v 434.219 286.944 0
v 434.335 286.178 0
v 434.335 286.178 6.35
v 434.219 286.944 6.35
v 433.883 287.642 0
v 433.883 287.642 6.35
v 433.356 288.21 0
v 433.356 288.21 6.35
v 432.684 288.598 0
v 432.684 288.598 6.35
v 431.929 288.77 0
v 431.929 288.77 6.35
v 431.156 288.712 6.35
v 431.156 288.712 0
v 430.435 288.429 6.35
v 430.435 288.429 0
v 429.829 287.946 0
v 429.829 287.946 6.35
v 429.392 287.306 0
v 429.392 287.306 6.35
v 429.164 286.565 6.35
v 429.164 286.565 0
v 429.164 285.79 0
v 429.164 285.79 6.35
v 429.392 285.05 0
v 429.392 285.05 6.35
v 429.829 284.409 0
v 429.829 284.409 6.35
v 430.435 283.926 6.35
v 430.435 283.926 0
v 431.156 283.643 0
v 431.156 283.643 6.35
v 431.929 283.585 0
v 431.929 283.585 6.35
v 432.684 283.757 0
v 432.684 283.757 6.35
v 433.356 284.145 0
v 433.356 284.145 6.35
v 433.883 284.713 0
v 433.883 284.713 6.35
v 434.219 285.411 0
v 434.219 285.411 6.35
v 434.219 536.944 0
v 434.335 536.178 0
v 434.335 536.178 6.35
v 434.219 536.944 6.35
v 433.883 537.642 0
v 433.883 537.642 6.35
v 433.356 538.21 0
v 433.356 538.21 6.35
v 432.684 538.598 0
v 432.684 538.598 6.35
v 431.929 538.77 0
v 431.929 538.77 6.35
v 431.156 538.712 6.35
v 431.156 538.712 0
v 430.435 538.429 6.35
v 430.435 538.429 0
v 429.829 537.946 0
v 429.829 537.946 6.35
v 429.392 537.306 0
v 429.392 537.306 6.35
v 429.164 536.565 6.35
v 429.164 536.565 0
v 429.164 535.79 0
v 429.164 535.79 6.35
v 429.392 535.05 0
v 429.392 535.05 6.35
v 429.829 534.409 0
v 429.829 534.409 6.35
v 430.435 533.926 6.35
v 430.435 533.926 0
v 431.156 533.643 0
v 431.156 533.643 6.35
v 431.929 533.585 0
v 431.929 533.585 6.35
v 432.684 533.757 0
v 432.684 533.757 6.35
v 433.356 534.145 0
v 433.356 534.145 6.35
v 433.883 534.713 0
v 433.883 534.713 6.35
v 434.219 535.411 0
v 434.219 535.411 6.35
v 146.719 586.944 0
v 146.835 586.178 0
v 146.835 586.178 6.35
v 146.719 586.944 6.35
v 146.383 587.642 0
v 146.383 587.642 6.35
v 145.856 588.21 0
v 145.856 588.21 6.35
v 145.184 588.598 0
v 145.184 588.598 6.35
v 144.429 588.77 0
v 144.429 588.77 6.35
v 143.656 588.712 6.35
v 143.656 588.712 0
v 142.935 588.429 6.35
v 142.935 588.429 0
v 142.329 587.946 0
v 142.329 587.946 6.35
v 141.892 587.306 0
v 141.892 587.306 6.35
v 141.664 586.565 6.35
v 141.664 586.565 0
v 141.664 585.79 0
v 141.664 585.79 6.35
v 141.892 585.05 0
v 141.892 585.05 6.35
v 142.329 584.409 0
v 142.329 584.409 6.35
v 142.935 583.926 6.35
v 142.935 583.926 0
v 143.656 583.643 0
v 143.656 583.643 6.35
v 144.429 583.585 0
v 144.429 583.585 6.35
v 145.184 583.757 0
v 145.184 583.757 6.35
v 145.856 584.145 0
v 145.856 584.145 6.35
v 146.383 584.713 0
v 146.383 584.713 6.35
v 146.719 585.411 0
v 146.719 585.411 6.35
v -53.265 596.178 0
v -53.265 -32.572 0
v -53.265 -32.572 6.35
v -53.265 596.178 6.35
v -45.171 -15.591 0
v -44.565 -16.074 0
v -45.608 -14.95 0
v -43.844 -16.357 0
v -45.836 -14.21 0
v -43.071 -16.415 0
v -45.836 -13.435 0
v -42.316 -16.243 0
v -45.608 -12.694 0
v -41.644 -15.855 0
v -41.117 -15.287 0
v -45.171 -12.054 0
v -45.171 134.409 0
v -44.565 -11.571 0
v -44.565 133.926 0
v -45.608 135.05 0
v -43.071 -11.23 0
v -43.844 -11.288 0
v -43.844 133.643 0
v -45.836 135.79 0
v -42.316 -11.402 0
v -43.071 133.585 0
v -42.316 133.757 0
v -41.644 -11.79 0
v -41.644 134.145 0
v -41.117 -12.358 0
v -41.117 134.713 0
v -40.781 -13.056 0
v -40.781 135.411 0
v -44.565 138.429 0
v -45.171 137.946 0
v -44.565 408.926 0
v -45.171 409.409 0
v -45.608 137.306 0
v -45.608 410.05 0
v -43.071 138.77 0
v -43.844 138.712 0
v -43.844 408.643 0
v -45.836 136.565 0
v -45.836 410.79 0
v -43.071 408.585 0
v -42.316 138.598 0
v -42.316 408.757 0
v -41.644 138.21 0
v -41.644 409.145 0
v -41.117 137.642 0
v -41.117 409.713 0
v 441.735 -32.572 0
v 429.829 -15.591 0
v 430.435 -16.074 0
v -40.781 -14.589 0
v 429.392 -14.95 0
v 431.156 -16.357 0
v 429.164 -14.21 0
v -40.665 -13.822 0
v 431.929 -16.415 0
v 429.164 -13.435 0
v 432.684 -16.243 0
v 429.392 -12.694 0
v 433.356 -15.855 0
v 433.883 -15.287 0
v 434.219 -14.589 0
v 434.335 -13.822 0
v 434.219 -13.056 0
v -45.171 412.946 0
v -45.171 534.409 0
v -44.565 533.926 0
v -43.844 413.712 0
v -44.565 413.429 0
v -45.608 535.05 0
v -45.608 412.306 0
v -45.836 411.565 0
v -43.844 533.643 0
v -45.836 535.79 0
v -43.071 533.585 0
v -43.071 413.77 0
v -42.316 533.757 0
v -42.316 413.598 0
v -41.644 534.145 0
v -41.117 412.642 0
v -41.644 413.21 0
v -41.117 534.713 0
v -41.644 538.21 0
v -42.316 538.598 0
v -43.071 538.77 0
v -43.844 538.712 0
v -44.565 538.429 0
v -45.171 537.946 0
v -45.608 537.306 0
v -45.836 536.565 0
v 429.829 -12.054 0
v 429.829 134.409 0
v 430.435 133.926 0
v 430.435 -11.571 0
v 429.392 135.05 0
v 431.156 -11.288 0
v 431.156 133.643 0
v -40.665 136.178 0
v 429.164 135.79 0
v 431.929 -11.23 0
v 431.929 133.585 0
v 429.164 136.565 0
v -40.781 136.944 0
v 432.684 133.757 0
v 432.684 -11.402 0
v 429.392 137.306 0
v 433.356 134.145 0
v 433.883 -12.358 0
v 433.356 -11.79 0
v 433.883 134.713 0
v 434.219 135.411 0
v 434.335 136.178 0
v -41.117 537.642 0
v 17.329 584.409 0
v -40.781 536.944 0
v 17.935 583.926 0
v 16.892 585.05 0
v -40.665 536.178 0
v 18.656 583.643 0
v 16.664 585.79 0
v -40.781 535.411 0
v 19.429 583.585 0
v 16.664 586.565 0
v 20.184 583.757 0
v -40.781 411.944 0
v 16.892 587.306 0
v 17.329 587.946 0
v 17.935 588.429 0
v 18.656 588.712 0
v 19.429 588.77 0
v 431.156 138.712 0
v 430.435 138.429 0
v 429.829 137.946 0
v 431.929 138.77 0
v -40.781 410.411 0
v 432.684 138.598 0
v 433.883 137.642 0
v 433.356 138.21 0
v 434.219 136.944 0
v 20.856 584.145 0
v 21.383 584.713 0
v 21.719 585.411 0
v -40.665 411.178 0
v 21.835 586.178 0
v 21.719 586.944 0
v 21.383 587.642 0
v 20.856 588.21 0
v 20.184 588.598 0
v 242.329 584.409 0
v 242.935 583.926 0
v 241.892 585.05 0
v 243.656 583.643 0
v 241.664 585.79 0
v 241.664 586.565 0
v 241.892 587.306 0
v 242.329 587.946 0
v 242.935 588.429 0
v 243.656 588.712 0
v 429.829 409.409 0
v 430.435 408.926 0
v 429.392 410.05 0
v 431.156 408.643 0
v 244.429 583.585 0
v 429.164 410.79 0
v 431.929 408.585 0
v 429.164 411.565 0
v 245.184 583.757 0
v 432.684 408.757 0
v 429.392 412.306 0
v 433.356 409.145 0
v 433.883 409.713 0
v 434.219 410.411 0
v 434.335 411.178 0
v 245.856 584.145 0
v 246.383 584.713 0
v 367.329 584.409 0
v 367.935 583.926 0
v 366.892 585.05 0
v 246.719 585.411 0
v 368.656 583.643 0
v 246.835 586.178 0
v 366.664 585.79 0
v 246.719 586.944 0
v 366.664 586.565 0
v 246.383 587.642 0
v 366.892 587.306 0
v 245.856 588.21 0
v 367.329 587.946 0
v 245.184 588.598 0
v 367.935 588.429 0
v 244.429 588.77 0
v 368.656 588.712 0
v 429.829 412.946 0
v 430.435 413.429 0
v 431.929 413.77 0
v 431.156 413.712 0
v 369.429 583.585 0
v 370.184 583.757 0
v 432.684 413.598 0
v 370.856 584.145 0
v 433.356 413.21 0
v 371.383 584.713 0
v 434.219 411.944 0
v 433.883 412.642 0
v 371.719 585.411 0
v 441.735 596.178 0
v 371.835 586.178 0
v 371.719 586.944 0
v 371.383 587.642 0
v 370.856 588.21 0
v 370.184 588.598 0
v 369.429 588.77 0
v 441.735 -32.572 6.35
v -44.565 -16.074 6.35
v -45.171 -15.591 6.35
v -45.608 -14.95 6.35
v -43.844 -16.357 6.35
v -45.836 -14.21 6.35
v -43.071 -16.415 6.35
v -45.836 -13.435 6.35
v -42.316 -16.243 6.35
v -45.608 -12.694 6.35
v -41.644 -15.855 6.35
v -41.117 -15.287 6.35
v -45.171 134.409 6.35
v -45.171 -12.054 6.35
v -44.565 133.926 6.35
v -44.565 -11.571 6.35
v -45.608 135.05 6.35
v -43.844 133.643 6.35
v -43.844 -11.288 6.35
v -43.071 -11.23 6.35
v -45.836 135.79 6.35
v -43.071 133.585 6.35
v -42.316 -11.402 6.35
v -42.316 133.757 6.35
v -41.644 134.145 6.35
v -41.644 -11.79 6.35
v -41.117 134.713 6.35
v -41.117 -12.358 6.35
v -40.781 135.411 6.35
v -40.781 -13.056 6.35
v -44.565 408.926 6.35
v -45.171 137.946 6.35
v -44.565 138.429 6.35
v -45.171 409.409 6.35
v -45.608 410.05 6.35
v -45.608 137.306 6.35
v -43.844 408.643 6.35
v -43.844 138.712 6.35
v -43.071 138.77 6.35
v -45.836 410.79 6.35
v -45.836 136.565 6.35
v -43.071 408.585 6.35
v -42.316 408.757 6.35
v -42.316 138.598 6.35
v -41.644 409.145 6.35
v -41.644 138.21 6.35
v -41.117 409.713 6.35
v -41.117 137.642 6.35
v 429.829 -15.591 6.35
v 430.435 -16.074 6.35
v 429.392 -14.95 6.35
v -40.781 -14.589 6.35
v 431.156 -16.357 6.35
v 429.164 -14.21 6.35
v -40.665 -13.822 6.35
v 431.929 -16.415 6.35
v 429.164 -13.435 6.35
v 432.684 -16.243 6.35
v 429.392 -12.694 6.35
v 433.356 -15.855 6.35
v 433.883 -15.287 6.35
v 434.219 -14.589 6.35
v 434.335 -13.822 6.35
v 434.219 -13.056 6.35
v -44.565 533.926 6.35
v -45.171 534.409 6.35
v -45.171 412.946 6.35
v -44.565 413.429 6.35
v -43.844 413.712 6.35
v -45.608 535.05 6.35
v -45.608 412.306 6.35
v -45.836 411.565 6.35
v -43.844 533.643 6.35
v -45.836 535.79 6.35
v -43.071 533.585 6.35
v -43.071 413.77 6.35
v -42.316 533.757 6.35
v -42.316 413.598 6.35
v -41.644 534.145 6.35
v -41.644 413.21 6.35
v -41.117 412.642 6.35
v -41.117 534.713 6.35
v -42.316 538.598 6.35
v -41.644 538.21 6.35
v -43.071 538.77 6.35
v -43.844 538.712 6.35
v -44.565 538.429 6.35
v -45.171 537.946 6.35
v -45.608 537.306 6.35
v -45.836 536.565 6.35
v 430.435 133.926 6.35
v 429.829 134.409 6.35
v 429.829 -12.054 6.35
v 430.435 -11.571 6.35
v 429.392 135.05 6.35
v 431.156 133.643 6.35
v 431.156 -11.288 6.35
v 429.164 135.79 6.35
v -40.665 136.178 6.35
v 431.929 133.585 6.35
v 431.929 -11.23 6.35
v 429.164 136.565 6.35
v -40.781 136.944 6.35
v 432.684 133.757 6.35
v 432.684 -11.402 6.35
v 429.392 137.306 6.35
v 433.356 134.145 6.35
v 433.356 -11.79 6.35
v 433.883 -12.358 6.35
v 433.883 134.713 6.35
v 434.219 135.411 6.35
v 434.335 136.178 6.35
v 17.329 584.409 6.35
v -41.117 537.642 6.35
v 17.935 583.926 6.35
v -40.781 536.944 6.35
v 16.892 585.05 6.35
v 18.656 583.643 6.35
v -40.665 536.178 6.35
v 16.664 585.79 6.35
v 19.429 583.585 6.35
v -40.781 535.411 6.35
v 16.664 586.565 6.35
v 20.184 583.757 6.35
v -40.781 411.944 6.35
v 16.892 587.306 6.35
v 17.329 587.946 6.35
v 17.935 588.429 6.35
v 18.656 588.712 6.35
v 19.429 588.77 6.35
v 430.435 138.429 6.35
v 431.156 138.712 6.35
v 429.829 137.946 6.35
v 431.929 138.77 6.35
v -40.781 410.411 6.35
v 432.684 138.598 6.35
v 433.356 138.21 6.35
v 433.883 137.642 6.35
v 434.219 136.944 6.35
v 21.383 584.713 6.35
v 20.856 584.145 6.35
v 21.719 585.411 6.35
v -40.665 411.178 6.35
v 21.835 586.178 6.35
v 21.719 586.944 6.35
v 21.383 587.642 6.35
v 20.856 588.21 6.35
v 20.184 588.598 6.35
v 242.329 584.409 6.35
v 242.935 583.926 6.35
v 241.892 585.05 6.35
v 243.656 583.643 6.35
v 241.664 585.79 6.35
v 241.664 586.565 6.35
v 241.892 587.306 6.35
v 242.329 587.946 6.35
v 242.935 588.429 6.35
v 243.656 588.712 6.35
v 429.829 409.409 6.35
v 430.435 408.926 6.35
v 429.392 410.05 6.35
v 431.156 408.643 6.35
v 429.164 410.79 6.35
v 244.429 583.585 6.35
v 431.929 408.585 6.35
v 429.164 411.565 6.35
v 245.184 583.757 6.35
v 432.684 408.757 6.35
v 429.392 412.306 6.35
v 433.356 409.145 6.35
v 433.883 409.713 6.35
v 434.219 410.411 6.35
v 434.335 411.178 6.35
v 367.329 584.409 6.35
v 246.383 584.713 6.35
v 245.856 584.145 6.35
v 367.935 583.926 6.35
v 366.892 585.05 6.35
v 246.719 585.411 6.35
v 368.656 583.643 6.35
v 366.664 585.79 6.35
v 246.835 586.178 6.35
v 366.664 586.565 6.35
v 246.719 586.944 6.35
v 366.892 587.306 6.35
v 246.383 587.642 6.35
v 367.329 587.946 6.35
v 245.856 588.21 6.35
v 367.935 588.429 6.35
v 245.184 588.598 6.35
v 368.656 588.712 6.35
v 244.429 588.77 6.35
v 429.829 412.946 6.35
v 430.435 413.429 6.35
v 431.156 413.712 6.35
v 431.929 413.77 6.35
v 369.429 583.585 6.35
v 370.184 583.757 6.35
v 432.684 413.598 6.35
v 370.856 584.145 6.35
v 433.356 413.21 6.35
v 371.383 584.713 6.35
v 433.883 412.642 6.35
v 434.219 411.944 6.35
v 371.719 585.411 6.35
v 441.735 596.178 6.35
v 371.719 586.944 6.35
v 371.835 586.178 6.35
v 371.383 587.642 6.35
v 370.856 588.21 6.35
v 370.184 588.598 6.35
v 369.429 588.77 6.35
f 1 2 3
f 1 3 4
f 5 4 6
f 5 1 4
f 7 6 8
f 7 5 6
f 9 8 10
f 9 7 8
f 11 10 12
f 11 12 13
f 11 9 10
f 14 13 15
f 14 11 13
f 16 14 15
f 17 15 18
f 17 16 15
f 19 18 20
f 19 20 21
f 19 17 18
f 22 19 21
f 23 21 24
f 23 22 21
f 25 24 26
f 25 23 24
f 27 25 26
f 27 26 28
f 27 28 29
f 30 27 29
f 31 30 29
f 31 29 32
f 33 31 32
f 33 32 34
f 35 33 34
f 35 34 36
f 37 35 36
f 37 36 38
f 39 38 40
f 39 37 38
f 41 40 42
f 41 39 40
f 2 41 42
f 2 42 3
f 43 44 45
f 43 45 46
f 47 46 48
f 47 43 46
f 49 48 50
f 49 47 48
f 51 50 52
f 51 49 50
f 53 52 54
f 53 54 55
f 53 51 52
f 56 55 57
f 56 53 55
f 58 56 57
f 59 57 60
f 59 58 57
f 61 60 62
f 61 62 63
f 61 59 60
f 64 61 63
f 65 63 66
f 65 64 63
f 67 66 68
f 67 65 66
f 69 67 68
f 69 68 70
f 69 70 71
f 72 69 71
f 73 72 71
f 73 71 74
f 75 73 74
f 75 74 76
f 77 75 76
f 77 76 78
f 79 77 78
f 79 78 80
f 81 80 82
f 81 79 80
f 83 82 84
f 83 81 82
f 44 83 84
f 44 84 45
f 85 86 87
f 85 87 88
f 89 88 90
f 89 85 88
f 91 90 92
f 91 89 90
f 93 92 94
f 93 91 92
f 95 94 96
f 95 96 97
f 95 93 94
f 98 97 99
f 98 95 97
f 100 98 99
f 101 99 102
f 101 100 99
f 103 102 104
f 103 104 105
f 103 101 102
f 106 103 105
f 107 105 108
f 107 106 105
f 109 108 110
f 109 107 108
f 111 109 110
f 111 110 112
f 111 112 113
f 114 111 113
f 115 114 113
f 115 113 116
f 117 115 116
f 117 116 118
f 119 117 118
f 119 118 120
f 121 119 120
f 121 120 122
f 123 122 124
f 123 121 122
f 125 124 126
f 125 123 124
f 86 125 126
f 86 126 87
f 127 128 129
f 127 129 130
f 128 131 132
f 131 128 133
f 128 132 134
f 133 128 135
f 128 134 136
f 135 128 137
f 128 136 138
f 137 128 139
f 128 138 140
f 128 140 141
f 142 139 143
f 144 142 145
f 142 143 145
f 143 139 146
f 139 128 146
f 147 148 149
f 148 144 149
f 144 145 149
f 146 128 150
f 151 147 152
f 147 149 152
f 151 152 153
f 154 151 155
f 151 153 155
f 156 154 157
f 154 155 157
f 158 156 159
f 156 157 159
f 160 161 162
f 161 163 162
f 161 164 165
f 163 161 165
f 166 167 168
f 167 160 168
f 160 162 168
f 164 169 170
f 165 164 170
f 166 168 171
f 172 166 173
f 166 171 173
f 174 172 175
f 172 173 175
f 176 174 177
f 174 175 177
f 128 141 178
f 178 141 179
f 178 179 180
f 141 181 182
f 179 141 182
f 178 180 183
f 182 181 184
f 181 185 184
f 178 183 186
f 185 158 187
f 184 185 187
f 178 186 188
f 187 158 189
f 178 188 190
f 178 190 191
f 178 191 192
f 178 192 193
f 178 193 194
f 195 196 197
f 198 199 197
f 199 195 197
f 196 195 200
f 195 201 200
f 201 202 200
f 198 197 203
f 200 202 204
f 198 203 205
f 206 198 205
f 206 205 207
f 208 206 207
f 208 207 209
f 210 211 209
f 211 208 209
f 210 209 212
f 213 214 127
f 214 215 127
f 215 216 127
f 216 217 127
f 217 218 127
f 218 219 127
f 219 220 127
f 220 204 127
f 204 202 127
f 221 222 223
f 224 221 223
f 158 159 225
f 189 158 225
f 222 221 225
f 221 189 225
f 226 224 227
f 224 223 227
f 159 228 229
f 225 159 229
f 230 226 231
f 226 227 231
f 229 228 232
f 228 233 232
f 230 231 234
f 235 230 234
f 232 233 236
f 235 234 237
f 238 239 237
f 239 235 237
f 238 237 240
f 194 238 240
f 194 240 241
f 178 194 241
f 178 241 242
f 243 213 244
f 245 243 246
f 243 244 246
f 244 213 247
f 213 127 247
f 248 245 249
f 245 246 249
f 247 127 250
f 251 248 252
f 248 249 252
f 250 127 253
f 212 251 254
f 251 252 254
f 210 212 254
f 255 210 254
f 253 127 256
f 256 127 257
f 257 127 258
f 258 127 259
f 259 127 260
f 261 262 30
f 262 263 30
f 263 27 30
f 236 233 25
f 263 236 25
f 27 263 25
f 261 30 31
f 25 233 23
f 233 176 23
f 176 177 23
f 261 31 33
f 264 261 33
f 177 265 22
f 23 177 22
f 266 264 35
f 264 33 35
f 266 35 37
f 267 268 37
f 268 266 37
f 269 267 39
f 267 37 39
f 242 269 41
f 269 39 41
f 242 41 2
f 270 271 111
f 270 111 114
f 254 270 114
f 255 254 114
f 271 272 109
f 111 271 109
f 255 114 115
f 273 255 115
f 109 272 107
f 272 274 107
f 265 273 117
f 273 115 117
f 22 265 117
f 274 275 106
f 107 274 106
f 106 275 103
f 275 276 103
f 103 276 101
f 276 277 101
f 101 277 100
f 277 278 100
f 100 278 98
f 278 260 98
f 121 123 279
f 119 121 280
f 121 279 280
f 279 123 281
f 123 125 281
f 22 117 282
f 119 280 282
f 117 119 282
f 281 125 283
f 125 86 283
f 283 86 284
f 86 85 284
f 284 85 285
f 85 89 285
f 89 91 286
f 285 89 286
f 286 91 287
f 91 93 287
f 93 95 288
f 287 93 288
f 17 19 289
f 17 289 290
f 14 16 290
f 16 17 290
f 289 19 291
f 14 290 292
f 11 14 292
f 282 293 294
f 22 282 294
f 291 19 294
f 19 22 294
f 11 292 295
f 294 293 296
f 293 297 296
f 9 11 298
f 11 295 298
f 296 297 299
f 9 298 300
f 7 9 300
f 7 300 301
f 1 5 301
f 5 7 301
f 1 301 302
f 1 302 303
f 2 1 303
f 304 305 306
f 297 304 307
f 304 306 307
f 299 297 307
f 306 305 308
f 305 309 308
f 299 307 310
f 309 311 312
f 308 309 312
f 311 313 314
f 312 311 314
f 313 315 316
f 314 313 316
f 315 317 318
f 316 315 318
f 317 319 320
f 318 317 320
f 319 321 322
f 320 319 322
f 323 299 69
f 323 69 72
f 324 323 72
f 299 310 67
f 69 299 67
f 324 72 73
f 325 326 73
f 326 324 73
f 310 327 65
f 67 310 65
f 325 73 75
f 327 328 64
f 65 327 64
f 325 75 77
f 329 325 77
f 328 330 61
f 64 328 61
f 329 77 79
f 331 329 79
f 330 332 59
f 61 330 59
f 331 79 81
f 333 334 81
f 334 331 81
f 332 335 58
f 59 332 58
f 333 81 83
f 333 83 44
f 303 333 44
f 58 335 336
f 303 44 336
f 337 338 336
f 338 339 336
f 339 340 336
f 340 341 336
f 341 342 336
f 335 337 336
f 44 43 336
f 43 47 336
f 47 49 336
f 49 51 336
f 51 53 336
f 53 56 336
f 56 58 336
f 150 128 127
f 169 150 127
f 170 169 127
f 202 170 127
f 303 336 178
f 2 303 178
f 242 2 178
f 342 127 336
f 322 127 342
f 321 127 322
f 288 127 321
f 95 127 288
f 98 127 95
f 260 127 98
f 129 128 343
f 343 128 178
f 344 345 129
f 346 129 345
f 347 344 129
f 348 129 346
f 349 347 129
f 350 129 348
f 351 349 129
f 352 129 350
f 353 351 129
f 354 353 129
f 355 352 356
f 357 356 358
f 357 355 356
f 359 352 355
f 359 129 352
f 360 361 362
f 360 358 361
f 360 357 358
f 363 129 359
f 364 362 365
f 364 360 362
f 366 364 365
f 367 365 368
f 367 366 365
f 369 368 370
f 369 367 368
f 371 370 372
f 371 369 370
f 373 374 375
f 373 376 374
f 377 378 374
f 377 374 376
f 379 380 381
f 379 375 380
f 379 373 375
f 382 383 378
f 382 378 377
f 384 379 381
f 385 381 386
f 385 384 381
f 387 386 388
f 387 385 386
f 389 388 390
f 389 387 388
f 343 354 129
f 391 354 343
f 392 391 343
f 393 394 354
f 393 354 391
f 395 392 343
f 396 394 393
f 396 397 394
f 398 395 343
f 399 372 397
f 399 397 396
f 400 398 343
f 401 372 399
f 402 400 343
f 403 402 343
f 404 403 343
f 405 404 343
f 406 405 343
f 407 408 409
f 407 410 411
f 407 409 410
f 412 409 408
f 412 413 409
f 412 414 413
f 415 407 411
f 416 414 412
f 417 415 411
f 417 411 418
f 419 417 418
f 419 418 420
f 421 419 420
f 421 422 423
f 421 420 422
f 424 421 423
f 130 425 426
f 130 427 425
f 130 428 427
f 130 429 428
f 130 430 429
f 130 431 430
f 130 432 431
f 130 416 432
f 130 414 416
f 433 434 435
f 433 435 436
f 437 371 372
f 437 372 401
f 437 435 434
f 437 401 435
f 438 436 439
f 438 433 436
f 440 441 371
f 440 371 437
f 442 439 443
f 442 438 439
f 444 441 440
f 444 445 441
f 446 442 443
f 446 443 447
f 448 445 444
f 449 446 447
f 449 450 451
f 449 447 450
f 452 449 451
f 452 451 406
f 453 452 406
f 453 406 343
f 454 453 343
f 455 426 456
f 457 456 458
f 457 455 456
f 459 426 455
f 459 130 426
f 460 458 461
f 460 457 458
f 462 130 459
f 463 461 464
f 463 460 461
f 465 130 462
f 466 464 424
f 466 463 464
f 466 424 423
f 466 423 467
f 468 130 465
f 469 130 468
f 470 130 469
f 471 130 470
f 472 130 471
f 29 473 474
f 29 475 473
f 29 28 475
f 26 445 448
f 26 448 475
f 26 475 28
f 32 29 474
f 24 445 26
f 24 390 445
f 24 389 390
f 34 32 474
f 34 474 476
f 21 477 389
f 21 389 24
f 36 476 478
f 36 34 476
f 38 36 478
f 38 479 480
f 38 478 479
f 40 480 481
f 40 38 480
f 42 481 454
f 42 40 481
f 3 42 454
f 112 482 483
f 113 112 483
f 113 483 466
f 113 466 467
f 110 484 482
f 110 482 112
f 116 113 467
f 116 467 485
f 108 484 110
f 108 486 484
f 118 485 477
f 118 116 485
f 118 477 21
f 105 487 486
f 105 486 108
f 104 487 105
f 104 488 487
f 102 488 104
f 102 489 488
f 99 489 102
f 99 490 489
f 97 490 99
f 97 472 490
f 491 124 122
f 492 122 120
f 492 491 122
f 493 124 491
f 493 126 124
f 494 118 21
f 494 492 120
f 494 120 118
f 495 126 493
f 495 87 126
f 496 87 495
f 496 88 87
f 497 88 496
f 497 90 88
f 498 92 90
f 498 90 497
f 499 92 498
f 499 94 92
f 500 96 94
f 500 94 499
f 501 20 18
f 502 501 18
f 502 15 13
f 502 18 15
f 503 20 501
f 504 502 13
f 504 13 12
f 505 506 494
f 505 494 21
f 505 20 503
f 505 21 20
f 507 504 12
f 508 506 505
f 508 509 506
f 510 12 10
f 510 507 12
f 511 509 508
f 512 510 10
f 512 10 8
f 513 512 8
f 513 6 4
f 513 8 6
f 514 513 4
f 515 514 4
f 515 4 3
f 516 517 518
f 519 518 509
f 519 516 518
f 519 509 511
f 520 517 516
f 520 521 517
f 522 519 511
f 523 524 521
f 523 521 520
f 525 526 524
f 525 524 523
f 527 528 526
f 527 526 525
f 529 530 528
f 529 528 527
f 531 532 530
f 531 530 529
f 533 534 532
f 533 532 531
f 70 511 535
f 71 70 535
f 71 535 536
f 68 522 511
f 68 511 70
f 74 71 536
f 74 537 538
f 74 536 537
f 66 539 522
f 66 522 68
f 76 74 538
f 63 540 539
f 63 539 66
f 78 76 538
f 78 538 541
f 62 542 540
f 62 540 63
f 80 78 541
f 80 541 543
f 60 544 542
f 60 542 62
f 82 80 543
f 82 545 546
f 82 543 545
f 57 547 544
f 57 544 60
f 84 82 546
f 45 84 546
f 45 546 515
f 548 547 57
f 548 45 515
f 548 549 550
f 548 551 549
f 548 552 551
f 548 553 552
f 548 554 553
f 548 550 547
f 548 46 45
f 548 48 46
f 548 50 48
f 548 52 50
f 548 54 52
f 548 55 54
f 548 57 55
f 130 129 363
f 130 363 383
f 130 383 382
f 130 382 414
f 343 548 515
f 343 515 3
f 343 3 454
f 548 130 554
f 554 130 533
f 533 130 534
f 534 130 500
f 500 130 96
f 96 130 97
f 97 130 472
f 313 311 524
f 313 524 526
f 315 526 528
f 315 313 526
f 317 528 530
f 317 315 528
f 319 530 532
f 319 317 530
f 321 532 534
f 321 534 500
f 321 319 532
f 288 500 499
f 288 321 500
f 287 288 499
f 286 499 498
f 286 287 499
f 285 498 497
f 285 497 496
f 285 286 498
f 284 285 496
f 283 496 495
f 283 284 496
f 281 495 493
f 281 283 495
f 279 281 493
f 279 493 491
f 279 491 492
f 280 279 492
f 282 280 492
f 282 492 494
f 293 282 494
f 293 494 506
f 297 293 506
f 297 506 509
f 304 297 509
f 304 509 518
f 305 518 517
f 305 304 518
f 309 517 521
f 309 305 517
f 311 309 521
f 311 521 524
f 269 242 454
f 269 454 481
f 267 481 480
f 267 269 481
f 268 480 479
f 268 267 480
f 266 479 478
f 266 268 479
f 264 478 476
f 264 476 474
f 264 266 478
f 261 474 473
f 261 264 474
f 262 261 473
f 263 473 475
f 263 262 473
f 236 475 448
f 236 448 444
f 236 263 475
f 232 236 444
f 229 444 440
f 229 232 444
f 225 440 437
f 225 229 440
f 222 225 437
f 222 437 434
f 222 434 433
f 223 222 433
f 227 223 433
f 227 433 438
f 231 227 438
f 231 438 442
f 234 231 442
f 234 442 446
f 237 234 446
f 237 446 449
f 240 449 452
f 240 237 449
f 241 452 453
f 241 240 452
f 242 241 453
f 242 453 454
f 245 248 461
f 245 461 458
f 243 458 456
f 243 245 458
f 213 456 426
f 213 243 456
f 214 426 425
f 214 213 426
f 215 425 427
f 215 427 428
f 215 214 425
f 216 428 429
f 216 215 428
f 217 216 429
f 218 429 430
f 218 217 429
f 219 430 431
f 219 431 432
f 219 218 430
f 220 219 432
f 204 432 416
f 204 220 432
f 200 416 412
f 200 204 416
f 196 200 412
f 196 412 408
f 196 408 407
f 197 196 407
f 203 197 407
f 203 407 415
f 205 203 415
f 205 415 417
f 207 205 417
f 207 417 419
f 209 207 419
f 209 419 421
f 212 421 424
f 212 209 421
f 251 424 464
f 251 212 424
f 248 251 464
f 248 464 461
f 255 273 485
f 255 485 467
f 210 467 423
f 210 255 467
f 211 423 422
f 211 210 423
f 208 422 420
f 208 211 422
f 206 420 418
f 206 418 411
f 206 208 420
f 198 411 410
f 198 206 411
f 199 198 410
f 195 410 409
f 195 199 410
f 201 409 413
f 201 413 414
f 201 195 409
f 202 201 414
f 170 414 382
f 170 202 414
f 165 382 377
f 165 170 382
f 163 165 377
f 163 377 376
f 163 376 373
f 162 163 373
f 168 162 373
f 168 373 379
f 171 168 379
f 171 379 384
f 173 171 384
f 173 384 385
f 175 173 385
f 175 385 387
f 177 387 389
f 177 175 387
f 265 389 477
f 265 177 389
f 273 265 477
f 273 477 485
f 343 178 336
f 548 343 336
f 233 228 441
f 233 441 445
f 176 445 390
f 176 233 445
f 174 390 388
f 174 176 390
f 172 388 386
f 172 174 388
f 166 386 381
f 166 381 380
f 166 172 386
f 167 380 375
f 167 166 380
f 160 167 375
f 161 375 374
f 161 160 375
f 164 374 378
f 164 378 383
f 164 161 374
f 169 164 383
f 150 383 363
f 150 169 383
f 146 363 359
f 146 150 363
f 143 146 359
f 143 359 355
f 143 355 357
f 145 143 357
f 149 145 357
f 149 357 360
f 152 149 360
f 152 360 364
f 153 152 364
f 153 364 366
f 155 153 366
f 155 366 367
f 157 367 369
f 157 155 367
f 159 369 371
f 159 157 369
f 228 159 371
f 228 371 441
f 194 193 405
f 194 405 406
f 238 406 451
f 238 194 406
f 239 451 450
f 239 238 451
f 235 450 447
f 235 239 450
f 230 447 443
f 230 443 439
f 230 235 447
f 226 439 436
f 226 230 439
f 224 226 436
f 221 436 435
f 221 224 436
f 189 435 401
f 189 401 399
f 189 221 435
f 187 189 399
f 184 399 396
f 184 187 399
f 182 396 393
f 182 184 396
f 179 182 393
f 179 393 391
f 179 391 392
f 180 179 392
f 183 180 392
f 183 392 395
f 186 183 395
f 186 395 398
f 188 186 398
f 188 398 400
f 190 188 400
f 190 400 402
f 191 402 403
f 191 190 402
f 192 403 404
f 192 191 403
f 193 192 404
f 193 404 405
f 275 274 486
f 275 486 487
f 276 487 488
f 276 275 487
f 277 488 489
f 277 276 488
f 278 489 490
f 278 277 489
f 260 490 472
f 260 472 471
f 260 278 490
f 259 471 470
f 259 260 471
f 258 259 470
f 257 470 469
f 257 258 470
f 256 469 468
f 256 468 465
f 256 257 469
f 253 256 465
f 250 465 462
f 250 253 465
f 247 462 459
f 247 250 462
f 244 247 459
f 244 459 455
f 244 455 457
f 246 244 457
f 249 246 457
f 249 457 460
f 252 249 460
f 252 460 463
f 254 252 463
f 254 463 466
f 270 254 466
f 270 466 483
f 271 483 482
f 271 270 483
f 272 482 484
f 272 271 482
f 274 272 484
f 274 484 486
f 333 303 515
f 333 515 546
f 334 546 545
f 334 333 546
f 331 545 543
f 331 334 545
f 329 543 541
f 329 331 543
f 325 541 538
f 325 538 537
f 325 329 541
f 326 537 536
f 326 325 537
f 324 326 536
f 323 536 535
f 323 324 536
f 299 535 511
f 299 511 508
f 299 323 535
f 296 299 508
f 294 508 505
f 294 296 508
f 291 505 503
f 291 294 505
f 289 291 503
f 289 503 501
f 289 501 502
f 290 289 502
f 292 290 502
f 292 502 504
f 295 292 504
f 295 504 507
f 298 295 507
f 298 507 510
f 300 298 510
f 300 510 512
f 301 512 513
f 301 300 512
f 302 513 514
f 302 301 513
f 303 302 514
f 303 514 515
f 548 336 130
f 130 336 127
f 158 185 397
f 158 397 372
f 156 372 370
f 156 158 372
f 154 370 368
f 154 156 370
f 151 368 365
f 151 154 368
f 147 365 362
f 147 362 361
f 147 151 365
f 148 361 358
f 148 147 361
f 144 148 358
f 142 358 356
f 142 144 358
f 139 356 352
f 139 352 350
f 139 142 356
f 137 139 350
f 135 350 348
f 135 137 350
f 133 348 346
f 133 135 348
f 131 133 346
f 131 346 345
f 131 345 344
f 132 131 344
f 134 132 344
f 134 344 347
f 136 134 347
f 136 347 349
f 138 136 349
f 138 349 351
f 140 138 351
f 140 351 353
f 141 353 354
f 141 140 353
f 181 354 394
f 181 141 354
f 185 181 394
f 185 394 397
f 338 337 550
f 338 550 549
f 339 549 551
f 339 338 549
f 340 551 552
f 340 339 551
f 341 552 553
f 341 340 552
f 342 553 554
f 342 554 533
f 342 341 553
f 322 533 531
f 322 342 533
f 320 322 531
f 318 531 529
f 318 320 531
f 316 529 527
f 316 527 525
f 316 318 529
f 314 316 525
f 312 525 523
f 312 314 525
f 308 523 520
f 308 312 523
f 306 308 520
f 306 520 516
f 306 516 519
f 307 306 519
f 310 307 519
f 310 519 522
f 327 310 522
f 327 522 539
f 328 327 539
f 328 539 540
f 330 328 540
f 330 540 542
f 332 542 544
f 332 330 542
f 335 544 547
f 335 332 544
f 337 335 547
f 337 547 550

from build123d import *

# Parameters (mm, degrees)
F0_W     = 247.5
F0_H     = 628.75
F0_R     = 2.6
F1_DEPTH = 6.35


with BuildPart() as f1:
    # F0 (on Top) → F1 (new body)
    with BuildSketch(Plane.XY):
        with Locations((70.48457, 281.802623)):
            Rectangle(F0_W, F0_H)
        with Locations((-43.26543, -13.822377)):
            Circle(F0_R, mode=Mode.SUBTRACT)
        with Locations((-43.26543, 136.177623)):
            Circle(F0_R, mode=Mode.SUBTRACT)
        with Locations((-43.26543, 411.177623)):
            Circle(F0_R, mode=Mode.SUBTRACT)
        with Locations((-43.26543, 536.177623)):
            Circle(F0_R, mode=Mode.SUBTRACT)
        with Locations((19.23457, 586.177623)):
            Circle(F0_R, mode=Mode.SUBTRACT)
        with Locations((144.23457, 586.177623)):
            Circle(F0_R, mode=Mode.SUBTRACT)
        with Locations((317.98457, 281.802623)):
            Rectangle(F0_W, F0_H)
        with Locations((431.73457, -13.822377)):
            Circle(F0_R, mode=Mode.SUBTRACT)
        with Locations((431.73457, 136.177623)):
            Circle(F0_R, mode=Mode.SUBTRACT)
        with Locations((431.73457, 286.177623)):
            Circle(F0_R, mode=Mode.SUBTRACT)
        with Locations((431.73457, 411.177623)):
            Circle(F0_R, mode=Mode.SUBTRACT)
        with Locations((244.23457, 586.177623)):
            Circle(F0_R, mode=Mode.SUBTRACT)
        with Locations((369.23457, 586.177623)):
            Circle(F0_R, mode=Mode.SUBTRACT)
        with Locations((431.73457, 536.177623)):
            Circle(F0_R, mode=Mode.SUBTRACT)
    extrude(amount=F1_DEPTH)


solid = f1.part
